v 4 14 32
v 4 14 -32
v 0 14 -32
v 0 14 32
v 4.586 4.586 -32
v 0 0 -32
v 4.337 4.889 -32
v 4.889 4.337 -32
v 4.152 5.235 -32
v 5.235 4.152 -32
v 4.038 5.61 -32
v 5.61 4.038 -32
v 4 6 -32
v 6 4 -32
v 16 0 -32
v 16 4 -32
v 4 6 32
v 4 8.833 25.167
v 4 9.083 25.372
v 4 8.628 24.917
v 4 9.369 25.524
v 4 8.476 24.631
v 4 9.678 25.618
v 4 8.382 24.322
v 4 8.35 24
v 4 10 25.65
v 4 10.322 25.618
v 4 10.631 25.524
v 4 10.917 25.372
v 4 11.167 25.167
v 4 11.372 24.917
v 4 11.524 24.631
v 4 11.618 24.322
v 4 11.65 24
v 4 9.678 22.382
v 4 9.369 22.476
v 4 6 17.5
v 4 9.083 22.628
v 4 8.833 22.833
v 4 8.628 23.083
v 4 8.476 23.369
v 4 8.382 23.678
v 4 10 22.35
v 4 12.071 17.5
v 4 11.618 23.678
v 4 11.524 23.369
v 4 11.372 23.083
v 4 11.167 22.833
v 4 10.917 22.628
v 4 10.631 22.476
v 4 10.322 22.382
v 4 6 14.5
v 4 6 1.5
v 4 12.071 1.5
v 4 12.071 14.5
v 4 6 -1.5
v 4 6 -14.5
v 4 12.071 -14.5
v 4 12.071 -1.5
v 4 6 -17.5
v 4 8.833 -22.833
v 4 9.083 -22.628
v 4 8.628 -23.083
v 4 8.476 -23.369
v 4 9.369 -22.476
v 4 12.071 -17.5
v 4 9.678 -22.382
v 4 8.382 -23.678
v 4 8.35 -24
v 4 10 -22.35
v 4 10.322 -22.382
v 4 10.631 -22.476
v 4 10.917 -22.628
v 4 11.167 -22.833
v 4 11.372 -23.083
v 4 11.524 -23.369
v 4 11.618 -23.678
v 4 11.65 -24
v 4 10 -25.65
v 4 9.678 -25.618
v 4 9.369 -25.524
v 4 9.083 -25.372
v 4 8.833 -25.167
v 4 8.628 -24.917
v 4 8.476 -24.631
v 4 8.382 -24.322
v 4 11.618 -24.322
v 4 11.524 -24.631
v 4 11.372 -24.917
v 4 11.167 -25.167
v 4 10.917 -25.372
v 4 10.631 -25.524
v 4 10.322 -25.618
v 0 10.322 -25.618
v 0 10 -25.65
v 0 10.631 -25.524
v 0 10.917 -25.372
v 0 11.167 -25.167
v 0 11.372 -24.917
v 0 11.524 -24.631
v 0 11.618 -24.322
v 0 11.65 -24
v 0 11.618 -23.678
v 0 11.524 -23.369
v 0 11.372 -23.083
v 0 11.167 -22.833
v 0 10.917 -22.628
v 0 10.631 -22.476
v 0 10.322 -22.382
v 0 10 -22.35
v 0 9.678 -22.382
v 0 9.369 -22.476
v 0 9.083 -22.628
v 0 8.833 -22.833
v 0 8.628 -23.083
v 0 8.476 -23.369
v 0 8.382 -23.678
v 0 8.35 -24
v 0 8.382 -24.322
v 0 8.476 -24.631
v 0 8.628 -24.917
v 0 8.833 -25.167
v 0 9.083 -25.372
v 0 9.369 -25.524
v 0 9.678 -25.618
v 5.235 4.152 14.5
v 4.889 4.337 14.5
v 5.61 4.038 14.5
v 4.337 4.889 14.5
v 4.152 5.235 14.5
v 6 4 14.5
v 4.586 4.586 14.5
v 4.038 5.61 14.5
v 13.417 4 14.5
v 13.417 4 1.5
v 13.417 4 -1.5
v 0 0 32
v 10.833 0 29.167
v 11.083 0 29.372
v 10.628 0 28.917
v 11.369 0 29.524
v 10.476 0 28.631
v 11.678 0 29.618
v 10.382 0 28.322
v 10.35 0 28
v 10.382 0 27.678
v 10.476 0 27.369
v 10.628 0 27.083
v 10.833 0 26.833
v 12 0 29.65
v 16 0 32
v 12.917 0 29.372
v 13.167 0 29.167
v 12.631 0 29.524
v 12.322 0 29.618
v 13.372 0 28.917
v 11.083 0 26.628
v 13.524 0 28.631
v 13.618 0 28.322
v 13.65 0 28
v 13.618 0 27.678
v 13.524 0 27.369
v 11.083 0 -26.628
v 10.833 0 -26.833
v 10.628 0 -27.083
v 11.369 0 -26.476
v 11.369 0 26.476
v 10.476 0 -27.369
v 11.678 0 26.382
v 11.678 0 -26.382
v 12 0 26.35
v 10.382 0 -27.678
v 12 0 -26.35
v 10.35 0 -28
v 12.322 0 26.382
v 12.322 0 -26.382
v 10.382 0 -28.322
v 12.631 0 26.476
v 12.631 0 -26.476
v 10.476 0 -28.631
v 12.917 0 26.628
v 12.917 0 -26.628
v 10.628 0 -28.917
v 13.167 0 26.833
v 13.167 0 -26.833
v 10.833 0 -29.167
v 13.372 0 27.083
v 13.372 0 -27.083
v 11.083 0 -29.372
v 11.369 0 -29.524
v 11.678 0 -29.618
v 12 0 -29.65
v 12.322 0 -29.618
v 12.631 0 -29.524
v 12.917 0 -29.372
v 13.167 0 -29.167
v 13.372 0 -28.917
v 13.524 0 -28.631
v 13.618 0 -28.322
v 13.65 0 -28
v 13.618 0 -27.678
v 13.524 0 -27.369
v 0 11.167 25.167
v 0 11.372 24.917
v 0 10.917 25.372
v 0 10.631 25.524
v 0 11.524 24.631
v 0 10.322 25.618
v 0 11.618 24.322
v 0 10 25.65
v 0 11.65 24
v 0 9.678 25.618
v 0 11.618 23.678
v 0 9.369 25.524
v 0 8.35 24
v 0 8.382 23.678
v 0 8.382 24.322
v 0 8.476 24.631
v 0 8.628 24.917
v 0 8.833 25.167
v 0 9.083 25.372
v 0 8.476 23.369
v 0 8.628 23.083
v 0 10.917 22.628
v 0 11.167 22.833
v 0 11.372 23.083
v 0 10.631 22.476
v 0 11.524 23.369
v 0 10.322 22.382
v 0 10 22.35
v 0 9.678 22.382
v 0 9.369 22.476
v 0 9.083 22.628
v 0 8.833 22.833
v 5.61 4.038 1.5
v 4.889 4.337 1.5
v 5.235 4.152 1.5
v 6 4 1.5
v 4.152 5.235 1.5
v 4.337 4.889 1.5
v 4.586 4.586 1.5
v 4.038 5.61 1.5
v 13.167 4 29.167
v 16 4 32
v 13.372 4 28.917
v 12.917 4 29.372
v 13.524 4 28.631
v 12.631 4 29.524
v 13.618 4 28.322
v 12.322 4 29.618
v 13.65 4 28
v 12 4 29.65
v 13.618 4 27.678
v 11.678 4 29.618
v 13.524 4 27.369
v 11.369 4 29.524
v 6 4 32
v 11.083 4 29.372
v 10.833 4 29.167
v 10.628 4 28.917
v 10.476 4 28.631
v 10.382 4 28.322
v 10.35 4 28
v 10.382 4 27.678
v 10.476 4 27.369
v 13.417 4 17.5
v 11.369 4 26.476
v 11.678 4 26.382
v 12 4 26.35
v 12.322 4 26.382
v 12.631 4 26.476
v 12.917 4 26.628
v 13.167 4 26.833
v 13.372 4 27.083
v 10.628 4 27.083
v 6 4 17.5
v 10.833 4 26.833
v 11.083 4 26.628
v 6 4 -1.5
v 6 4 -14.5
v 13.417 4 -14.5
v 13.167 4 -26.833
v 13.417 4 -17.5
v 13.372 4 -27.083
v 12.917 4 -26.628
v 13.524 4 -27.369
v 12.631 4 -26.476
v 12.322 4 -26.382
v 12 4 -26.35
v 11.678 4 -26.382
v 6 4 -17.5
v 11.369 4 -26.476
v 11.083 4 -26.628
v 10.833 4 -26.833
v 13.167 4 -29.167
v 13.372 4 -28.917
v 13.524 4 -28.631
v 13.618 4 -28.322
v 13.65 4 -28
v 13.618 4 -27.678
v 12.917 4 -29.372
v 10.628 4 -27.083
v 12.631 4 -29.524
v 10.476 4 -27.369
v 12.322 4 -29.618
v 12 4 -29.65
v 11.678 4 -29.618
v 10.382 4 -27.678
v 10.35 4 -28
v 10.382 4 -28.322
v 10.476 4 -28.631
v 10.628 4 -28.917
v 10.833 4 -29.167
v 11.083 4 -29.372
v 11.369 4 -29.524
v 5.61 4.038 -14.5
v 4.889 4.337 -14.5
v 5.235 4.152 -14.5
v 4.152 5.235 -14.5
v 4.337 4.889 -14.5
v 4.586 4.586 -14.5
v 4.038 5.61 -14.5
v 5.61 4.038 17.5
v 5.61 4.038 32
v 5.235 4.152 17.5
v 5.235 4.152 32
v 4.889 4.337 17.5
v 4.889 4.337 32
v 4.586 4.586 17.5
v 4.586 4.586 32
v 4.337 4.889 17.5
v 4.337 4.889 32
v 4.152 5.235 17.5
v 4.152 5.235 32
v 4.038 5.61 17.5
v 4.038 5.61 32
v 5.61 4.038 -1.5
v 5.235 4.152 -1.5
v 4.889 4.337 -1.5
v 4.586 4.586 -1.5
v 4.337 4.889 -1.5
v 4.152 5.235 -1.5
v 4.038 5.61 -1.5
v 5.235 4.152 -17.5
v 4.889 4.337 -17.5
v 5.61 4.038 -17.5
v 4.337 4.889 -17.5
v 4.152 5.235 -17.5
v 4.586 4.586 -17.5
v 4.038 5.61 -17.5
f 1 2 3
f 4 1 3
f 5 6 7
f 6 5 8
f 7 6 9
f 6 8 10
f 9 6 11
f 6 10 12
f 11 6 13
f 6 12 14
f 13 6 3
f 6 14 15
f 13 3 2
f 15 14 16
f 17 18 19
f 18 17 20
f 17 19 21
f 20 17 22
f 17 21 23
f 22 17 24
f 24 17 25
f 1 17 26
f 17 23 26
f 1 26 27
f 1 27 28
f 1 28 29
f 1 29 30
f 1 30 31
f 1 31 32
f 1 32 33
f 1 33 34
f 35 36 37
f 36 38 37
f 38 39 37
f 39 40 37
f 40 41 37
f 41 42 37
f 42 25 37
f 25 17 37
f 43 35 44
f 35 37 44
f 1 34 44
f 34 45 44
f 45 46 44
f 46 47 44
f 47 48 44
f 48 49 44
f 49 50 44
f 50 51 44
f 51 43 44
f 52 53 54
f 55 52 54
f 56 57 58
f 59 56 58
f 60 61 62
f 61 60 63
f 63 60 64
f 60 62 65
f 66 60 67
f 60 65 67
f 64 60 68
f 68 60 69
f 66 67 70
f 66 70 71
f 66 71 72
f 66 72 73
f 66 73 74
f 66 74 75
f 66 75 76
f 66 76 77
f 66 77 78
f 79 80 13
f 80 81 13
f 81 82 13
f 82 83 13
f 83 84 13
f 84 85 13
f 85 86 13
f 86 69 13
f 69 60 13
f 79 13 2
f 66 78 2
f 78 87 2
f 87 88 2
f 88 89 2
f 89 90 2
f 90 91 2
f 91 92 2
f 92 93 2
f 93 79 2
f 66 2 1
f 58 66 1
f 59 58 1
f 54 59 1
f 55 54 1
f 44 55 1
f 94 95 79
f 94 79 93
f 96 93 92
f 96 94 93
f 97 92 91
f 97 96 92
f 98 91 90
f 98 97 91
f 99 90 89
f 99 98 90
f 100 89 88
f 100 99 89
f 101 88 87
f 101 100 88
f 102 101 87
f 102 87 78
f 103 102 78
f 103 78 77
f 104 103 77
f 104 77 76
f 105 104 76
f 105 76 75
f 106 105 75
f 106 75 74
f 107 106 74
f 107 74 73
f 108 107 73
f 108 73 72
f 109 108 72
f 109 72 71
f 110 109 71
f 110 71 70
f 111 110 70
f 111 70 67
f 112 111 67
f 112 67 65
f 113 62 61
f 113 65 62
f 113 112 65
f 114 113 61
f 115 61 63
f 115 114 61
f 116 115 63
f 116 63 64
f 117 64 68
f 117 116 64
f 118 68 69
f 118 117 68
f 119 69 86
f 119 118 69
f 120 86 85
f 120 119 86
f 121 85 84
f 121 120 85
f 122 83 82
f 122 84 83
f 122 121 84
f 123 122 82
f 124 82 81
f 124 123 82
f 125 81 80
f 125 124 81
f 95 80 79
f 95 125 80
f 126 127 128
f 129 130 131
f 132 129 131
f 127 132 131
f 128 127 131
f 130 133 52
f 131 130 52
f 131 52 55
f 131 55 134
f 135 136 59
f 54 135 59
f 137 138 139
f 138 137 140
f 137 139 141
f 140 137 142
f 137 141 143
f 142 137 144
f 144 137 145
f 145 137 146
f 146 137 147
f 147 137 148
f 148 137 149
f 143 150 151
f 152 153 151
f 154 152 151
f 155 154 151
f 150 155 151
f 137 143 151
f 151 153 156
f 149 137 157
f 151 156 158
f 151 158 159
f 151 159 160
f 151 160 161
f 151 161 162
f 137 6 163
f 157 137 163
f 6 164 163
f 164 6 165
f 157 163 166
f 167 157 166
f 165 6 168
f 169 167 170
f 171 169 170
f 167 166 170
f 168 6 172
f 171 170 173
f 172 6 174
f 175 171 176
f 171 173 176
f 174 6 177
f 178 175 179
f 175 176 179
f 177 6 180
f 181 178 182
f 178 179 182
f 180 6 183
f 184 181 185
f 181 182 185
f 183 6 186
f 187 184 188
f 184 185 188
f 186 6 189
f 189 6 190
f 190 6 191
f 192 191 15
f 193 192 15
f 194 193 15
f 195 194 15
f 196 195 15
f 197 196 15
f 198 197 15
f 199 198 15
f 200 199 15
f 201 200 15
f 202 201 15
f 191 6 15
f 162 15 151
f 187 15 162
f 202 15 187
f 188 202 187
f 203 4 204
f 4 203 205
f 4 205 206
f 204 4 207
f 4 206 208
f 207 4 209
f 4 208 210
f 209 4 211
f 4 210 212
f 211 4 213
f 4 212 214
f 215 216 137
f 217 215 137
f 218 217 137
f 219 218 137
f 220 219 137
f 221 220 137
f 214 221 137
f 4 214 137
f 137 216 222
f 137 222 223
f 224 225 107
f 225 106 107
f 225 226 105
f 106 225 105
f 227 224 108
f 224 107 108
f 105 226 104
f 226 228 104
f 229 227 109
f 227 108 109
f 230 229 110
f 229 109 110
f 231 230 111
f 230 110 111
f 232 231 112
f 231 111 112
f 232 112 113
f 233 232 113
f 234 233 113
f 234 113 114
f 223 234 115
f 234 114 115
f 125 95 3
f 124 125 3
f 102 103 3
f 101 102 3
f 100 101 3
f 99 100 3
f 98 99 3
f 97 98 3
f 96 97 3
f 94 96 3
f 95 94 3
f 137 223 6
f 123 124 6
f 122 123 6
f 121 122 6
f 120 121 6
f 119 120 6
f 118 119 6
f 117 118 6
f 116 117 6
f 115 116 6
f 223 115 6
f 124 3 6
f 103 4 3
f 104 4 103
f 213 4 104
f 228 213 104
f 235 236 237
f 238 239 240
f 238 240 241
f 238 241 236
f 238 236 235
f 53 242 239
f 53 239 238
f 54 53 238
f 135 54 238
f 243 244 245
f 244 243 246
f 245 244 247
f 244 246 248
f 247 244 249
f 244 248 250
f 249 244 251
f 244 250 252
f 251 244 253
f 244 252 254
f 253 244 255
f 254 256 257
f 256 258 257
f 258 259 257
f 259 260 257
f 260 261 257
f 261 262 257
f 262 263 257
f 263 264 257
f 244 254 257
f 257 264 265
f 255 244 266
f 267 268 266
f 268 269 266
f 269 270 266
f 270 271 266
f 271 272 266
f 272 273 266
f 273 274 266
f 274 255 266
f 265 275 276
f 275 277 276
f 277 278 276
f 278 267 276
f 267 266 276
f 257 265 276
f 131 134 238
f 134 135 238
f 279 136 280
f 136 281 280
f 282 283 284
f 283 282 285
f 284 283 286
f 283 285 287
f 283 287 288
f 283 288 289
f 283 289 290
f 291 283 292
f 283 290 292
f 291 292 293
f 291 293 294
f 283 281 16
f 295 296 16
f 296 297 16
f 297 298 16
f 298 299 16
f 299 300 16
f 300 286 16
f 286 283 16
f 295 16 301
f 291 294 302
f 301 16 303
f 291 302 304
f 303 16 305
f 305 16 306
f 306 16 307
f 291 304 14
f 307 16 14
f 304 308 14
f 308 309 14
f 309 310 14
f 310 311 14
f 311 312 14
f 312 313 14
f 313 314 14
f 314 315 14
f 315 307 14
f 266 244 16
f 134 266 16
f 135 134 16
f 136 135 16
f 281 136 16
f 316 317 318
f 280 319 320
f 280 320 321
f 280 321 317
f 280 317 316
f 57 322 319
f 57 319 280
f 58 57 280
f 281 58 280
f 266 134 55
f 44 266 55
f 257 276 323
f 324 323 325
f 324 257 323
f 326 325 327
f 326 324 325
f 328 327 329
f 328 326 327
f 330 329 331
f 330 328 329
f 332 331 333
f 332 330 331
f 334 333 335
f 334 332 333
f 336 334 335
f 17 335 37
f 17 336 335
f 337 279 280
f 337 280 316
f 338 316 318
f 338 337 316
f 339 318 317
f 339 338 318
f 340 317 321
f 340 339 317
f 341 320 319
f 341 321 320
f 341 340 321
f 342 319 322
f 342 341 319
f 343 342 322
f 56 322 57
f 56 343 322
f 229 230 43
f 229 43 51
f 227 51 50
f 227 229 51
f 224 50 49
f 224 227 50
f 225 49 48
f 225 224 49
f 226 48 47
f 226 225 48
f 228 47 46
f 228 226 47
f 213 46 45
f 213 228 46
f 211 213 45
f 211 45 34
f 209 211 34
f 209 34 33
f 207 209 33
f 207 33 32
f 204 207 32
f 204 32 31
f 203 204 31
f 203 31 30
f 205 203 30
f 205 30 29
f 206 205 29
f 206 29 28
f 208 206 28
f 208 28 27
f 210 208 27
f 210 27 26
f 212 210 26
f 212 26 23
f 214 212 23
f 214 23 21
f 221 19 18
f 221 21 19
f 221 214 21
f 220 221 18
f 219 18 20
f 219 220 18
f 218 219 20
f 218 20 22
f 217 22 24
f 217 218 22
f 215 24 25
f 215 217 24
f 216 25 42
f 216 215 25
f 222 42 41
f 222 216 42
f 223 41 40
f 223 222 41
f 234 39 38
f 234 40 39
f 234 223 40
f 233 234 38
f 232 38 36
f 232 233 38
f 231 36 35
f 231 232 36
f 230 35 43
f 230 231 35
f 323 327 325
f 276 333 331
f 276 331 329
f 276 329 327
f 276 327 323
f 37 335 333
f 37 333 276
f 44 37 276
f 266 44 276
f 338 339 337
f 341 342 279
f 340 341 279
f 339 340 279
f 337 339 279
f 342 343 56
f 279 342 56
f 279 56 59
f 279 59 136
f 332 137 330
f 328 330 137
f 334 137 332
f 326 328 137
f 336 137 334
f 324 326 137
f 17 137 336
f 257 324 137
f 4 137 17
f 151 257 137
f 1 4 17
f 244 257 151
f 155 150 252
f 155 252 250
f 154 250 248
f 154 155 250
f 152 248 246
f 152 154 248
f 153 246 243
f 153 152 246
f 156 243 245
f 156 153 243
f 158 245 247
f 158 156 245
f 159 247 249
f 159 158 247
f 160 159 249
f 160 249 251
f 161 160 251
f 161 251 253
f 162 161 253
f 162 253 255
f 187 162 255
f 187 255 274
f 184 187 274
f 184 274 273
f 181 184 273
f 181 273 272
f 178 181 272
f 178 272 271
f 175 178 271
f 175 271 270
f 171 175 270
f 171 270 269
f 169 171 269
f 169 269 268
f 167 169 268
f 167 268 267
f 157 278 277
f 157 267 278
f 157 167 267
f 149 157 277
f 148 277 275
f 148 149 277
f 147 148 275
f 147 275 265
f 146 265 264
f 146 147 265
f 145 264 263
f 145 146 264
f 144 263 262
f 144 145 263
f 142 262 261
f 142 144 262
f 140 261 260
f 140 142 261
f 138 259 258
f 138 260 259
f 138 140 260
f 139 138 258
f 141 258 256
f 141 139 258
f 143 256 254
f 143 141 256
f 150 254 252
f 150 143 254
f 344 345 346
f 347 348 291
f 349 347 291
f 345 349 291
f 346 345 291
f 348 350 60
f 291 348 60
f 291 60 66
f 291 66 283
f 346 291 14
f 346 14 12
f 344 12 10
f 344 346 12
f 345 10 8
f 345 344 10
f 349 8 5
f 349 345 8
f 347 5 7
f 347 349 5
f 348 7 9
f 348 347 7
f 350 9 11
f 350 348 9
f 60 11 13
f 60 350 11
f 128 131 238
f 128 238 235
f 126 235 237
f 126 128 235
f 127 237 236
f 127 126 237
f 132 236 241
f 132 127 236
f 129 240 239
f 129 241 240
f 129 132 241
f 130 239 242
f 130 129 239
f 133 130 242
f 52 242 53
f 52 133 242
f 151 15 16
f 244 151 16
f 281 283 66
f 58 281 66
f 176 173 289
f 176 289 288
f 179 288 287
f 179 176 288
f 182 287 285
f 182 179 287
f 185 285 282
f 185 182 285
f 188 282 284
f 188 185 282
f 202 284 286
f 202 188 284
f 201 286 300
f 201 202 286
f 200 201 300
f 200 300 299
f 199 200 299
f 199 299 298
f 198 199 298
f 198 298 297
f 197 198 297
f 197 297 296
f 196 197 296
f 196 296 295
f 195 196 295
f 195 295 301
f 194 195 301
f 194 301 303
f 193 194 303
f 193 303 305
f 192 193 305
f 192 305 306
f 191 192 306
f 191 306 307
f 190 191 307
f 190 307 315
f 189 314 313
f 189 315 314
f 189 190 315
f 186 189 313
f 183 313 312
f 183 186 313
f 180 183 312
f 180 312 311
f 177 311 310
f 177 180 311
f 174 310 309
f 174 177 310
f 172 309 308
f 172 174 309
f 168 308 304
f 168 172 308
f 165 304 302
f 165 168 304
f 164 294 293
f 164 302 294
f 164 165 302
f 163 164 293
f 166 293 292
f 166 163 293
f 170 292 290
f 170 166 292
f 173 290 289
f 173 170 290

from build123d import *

# Parameters (mm, degrees)
F_1P5MM_64_START              = -32
F_1P5MM_64_DEPTH              = 64
CUT_EXTRUDE_M3_1_DEPTH        = 100
CUT_EXTRUDE_M3_1_DEPTH_BACK   = 100
SKETCH_2_R                    = 1.65
CUT_EXTRUDE_M3_1_2_DEPTH      = 100
CUT_EXTRUDE_M3_1_2_DEPTH_BACK = 100
SKETCH_4_R                    = 1.65
CUT_EXTRUDE_M3_1_3_DEPTH      = 100
CUT_EXTRUDE_M3_1_3_DEPTH_BACK = 100
SKETCH_5_R                    = 1.65
CUT_EXTRUDE_M3_1_4_DEPTH      = 100
CUT_EXTRUDE_M3_1_4_DEPTH_BACK = 100
SKETCH_7_R                    = 1.65
FDM_R2_R                      = 2
FDM_3MM_16_START              = -17.5
FDM_3MM_16_DEPTH              = 3
FDM_3MM_0_START               = -1.5
FDM_3MM_0_DEPTH               = 3
FDM_3MM_16_START_2            = 14.5
FDM_3MM_16_2_DEPTH            = 3


with BuildPart() as part:
    # 草图1 → 1p5mm铝合金直角座_宽64 (new body)
    with BuildSketch(Plane.XY.offset(F_1P5MM_64_START)):
        Polygon((0, 0), (16, 0), (16, 4), (4, 4), (4, 14), (0, 14), align=None)
    extrude(amount=F_1P5MM_64_DEPTH)

    # 草图2 → Cut-Extrude M3_-1 (cut, two sides: drawn at the far end of the back side and taken through both)
    with BuildSketch(Plane(origin=(0, 0, 0), x_dir=(0, 0, -1), z_dir=(1, 0, 0)).offset(-CUT_EXTRUDE_M3_1_DEPTH_BACK)):
        with Locations((24, 10)):
            Circle(SKETCH_2_R)
    extrude(amount=CUT_EXTRUDE_M3_1_DEPTH + CUT_EXTRUDE_M3_1_DEPTH_BACK, mode=Mode.SUBTRACT)

    # 草图4 → Cut-Extrude M3_-1 2 (cut, two sides: drawn at the far end of the back side and taken through both)
    with BuildSketch(Plane(origin=(0, 0, 0), x_dir=(1, 0, 0), z_dir=(0, 1, 0)).offset(-CUT_EXTRUDE_M3_1_2_DEPTH_BACK)):
        with Locations(Location((12, 28, 0), (0, 0, 270))):
            Circle(SKETCH_4_R)
    extrude(amount=CUT_EXTRUDE_M3_1_2_DEPTH + CUT_EXTRUDE_M3_1_2_DEPTH_BACK, mode=Mode.SUBTRACT)

    # 草图5 → Cut-Extrude M3_1 3 (cut, two sides: drawn at the far end of the back side and taken through both)
    with BuildSketch(Plane(origin=(0, 0, 0), x_dir=(0, 0, -1), z_dir=(1, 0, 0)).offset(-CUT_EXTRUDE_M3_1_3_DEPTH_BACK)):
        with Locations((-24, 10)):
            Circle(SKETCH_5_R)
    extrude(amount=CUT_EXTRUDE_M3_1_3_DEPTH + CUT_EXTRUDE_M3_1_3_DEPTH_BACK, mode=Mode.SUBTRACT)

    # 草图7 → Cut-Extrude M3_1 4 (cut, two sides: drawn at the far end of the back side and taken through both)
    with BuildSketch(Plane(origin=(0, 0, 0), x_dir=(1, 0, 0), z_dir=(0, 1, 0)).offset(-CUT_EXTRUDE_M3_1_4_DEPTH_BACK)):
        with Locations(Location((12, -28, 0), (0, 0, 270))):
            Circle(SKETCH_7_R)
    extrude(amount=CUT_EXTRUDE_M3_1_4_DEPTH + CUT_EXTRUDE_M3_1_4_DEPTH_BACK, mode=Mode.SUBTRACT)

    # FDM根部内圆角_R2
    fdm_r2_edges = [part.edges().sort_by_distance(p)[0] for p in [
        (4, 4, 0),
    ]]
    fillet(fdm_r2_edges, radius=FDM_R2_R)

    # 草图8 → FDM__3mm_-16 (add)
    with BuildSketch(Plane.XY.offset(FDM_3MM_16_START)):
        Polygon((3.5, 3.5), (14, 3.5), (3.5, 12.5), align=None)
    extrude(amount=FDM_3MM_16_DEPTH)

    # 草图9 → FDM三角加强筋_3mm_0 (add)
    with BuildSketch(Plane.XY.offset(FDM_3MM_0_START)):
        Polygon((3.5, 3.5), (14, 3.5), (3.5, 12.5), align=None)
    extrude(amount=FDM_3MM_0_DEPTH)

    # 草图10 → FDM__3mm_16 2 (add)
    with BuildSketch(Plane.XY.offset(FDM_3MM_16_START_2)):
        Polygon((3.5, 3.5), (14, 3.5), (3.5, 12.5), align=None)
    extrude(amount=FDM_3MM_16_2_DEPTH)


solid = part.part
